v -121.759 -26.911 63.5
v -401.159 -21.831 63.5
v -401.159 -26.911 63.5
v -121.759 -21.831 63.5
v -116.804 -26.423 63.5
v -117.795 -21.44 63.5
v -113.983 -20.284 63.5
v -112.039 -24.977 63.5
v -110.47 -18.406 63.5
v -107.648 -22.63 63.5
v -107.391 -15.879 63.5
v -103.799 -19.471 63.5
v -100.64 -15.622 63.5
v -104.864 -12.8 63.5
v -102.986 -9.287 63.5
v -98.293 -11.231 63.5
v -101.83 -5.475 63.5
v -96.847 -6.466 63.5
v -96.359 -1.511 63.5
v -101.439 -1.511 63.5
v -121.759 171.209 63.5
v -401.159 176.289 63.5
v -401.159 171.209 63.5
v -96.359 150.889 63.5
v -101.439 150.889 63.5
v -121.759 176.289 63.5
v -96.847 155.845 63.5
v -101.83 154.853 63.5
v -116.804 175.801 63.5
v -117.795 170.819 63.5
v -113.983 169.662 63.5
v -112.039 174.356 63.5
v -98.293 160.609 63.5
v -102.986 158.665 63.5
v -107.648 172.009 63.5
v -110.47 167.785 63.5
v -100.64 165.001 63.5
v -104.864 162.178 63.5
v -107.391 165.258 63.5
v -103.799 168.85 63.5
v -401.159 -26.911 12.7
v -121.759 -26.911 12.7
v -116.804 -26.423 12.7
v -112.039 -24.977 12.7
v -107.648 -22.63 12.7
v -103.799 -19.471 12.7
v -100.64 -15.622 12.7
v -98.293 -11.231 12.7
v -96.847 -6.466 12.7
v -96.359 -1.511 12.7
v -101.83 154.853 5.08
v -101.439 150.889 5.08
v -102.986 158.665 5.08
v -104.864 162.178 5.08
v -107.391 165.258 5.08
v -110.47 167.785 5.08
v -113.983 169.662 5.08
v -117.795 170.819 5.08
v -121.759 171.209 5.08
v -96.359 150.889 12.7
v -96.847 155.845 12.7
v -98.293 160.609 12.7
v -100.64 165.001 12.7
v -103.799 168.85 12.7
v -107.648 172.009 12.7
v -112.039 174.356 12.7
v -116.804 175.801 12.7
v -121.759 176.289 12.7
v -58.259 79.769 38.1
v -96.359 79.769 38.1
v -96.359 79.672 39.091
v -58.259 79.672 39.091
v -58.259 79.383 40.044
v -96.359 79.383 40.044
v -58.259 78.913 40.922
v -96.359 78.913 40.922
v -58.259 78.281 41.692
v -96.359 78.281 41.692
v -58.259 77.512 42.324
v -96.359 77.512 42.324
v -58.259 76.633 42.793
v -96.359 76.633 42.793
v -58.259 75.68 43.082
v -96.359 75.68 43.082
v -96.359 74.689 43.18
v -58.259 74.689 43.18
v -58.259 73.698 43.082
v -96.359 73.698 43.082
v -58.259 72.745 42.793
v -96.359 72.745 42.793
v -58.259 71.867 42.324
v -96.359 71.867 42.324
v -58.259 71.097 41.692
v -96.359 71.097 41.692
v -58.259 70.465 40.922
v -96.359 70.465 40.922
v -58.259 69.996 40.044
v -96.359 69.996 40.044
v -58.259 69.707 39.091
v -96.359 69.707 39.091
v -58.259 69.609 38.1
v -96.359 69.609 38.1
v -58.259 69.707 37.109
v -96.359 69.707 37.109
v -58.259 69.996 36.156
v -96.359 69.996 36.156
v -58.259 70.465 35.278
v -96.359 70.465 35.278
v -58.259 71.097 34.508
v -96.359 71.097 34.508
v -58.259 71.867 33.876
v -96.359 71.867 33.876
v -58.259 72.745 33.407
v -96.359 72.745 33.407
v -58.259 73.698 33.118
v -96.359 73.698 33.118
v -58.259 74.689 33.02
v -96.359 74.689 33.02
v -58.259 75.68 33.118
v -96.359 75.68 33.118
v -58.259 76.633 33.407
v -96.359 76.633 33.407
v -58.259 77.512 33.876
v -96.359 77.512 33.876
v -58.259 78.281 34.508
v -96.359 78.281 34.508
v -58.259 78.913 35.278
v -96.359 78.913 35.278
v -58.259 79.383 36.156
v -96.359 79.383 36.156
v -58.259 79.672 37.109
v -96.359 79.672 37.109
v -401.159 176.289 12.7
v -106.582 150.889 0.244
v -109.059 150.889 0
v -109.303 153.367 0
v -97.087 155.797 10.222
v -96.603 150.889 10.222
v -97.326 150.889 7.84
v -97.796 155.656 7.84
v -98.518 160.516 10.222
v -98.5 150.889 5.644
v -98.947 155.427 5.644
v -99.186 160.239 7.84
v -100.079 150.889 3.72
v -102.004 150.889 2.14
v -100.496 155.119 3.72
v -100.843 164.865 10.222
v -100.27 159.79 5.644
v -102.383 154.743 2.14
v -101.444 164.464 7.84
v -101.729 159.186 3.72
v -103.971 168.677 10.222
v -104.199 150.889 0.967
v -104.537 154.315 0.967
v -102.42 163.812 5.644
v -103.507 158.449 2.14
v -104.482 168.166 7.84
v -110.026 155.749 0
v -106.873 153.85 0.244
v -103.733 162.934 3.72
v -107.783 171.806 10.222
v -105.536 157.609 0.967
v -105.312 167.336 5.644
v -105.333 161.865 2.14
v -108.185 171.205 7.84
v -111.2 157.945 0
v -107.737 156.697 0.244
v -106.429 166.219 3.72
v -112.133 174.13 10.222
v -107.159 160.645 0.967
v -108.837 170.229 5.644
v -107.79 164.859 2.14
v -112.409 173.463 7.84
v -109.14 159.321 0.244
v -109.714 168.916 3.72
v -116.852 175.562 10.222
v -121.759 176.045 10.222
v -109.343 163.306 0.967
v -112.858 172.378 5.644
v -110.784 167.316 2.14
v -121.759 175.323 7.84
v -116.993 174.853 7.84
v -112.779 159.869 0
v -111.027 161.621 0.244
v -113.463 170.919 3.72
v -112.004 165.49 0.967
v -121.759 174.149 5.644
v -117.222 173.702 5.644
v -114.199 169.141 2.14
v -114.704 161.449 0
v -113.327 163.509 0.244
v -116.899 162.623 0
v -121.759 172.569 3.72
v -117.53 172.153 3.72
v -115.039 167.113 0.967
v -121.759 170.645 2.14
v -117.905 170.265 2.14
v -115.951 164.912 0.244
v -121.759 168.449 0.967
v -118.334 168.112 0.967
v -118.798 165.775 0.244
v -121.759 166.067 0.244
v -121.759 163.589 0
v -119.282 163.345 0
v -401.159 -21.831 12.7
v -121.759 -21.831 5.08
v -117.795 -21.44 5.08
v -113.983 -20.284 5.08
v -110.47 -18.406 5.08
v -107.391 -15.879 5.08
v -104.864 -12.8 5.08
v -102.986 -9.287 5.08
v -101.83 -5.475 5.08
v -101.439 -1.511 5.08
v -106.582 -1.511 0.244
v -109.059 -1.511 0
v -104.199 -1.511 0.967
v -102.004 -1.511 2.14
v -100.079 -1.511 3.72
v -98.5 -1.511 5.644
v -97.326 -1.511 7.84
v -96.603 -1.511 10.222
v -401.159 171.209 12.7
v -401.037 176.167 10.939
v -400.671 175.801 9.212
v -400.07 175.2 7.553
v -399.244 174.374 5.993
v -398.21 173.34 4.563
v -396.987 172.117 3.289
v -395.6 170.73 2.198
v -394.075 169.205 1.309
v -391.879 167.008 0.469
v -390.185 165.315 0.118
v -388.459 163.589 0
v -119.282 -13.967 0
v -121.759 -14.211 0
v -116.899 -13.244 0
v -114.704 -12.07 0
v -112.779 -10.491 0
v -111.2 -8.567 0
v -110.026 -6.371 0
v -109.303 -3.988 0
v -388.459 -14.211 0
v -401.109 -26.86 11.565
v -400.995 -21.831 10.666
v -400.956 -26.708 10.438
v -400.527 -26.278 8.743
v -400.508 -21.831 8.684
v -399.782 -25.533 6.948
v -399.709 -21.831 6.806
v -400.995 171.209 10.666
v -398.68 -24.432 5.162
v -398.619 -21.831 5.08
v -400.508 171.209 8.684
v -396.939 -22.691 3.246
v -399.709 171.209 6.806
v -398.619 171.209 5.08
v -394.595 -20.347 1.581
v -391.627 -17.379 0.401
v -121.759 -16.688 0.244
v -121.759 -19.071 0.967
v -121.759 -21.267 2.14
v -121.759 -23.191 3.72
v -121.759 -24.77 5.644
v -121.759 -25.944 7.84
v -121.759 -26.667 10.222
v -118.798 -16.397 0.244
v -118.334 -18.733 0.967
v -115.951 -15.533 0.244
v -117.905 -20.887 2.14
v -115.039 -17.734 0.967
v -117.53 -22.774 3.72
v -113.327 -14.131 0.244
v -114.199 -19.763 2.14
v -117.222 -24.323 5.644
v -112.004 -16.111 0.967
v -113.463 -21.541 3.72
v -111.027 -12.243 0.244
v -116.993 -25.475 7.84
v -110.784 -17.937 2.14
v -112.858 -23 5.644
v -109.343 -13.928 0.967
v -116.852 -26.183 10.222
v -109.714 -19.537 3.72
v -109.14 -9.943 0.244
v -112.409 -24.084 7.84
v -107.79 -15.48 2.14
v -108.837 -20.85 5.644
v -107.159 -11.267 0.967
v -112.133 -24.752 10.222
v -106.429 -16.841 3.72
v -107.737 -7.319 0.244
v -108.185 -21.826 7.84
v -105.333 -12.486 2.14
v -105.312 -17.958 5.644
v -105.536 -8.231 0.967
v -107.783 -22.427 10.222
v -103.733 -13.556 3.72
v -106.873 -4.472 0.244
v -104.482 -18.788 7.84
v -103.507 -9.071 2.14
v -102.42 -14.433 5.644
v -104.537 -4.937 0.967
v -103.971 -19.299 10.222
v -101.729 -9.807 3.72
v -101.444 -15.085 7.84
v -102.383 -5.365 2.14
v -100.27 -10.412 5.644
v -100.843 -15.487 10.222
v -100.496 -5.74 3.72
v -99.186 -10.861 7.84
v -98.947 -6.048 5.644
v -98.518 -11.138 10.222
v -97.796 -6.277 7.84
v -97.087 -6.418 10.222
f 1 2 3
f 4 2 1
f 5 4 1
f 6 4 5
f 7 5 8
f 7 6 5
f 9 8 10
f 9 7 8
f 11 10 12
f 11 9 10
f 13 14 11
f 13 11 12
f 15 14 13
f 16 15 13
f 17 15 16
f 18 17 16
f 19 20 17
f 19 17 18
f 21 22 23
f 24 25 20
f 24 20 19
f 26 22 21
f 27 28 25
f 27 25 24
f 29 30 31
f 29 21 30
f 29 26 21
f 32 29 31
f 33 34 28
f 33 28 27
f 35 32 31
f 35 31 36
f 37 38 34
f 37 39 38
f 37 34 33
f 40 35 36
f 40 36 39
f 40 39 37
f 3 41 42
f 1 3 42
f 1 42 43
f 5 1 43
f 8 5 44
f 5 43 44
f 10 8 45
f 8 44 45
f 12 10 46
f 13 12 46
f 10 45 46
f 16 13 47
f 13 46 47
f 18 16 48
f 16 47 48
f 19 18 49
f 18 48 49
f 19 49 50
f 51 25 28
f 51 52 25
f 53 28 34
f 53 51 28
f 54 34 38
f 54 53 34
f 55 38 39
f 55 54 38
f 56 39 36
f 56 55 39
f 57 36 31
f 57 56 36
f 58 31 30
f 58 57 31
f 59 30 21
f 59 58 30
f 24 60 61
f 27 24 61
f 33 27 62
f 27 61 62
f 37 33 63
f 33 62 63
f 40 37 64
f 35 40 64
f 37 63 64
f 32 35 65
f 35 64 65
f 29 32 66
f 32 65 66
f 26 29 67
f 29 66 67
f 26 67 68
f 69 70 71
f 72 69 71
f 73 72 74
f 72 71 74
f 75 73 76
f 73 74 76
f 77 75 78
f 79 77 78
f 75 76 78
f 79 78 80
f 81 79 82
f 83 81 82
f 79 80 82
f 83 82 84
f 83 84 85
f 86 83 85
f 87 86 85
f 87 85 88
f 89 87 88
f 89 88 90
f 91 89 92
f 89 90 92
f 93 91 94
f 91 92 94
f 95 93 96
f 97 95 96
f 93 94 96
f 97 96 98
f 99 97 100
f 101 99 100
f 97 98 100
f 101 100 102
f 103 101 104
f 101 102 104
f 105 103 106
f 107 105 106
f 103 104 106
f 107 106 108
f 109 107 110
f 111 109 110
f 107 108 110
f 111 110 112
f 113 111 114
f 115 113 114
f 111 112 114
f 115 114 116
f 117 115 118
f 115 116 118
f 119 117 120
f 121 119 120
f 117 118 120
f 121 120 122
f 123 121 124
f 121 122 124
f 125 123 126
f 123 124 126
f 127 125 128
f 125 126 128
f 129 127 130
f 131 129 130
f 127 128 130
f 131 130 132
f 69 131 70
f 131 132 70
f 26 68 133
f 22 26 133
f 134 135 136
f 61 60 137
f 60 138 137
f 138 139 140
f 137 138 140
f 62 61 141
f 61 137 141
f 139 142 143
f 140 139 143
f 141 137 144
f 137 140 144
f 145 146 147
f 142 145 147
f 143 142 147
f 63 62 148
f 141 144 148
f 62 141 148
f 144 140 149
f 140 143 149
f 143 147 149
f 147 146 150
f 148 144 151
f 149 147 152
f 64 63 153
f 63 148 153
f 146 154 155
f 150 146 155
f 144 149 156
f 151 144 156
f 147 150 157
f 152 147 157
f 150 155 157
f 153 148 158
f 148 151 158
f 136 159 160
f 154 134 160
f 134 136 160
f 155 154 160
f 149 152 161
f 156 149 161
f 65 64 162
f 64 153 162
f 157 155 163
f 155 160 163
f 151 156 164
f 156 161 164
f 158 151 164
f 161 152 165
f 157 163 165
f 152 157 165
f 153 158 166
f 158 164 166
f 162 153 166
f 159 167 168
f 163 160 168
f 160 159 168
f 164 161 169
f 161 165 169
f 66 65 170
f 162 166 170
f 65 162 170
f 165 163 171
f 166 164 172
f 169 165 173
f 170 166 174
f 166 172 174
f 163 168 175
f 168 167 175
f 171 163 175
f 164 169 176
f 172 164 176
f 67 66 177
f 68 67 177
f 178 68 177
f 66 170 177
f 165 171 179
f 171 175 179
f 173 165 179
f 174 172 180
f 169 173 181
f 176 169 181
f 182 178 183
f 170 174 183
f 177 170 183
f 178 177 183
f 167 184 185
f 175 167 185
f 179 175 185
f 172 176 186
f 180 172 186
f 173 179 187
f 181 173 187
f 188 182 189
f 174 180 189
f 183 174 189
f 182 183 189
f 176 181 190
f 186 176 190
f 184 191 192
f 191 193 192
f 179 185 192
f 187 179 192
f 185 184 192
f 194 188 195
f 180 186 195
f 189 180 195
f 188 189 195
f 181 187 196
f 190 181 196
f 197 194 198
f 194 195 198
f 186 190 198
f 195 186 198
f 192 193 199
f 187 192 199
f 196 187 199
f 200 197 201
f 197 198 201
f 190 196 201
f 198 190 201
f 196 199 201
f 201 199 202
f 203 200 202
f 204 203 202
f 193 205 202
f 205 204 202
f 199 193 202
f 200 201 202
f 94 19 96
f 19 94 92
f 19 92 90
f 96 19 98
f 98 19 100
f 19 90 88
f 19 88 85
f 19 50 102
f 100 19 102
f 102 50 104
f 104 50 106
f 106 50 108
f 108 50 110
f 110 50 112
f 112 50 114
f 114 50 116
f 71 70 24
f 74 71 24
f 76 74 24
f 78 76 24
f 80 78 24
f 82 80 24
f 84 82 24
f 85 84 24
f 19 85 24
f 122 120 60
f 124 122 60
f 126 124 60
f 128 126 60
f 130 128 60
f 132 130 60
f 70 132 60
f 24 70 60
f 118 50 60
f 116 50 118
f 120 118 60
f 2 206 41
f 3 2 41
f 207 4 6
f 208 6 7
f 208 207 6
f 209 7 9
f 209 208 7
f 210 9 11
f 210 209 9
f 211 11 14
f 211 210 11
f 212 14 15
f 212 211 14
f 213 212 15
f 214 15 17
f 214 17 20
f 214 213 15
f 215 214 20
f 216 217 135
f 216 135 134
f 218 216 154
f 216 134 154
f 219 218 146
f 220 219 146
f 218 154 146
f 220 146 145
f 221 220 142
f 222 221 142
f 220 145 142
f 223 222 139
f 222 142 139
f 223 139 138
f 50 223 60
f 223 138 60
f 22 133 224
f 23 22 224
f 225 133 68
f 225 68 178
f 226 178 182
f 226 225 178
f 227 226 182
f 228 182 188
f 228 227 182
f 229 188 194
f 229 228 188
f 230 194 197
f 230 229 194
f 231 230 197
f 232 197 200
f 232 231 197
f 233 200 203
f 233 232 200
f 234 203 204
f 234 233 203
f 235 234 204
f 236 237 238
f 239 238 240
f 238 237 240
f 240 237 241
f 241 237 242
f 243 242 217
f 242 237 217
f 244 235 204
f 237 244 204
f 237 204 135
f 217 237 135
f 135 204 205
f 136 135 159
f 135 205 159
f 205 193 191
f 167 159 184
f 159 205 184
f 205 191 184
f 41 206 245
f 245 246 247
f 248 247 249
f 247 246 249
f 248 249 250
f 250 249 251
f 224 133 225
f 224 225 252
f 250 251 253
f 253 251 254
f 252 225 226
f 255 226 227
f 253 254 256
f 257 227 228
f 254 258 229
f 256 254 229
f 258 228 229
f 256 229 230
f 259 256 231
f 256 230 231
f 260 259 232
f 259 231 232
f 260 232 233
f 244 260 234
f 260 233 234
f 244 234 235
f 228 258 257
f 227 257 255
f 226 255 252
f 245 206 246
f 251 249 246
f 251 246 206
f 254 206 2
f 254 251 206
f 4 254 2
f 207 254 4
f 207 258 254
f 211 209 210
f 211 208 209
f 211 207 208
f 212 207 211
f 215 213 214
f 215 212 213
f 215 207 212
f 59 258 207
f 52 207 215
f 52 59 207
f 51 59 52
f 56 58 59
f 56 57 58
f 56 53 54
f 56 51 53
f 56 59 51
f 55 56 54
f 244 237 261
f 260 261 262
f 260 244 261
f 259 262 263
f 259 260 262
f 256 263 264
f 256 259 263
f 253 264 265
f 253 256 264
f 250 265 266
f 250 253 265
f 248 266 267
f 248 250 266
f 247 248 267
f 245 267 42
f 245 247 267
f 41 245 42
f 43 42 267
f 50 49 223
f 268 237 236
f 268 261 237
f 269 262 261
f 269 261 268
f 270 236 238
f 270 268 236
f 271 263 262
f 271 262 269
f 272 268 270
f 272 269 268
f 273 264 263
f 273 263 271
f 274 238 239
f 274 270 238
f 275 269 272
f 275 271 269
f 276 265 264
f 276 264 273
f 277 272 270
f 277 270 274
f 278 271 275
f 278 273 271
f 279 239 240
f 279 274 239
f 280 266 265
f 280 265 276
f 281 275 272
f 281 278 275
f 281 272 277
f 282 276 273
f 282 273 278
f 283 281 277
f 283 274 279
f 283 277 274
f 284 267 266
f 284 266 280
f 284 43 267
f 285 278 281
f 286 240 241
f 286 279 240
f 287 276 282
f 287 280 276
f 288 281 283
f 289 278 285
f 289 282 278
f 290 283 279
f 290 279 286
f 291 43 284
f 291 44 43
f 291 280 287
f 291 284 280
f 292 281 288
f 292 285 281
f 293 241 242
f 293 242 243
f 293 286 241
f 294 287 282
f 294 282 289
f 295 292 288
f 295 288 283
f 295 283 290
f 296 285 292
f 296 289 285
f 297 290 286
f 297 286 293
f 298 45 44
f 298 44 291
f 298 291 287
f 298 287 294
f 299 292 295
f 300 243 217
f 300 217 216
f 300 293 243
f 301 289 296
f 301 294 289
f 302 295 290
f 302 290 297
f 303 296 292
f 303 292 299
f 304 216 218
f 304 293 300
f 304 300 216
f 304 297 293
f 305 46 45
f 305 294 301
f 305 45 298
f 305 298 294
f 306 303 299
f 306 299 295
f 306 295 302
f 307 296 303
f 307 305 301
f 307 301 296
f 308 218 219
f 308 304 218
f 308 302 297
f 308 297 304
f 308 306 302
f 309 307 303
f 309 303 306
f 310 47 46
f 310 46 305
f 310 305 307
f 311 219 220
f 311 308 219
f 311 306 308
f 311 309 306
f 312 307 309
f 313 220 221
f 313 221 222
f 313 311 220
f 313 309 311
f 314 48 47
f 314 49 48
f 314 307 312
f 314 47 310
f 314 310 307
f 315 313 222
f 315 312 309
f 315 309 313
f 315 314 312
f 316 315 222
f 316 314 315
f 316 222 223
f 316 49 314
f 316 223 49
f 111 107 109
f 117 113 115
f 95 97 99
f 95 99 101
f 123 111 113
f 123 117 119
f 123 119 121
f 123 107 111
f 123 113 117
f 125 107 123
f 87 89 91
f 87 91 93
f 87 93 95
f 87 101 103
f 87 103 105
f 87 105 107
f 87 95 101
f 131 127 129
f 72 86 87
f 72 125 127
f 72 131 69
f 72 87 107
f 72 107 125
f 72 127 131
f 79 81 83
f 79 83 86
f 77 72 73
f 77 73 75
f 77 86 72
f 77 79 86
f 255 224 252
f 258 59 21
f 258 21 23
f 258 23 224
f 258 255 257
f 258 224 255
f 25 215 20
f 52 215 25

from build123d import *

# Parameters (mm, degrees)
F1_DEPTH     = 63.5
F2_T         = -5.08
F3_R         = 5.08
F4_DEPTH     = 38.1
F5_T1_DEPTH  = 311.15
F5_T3_DEPTH  = 266.7
F5_T5_DEPTH  = 152.4
F5_T8_ANGLE  = 90
F5_T10_ANGLE = 90


# Not quite as in the source:
# - a fillet or chamfer that OpenCascade refuses, or shapes differently, is made with other operations: its cross-section is extruded or revolved along the edge and cut away or added


with BuildPart() as f1:
    # F0 (on Top) → F1 (new body)
    with BuildSketch(Plane.XY):
        with BuildLine():
            Line((-344.2945734978, 176.2892417401), (-401.1594021572, 176.2892417401))
            Line((-401.1594021572, 176.2892417401), (-401.1594021572, -26.9107582599))
            Line((-401.1594021572, -26.9107582599), (-344.2945734978, -26.9107582599))
            Line((-344.2945734978, -26.9107582599), (-121.7594021572, -26.9107582599))
            ThreePointArc((-121.7594021572, -26.9107582599), (-103.7988899151, -19.471270502), (-96.3594021572, -1.5107582599))
            Line((-96.3594021572, -1.5107582599), (-96.3594021572, 6.5090437472))
            Line((-96.3594021572, 6.5090437472), (-96.3594021572, 44.6090437472))
            Line((-96.3594021572, 44.6090437472), (-96.3594021572, 150.8892417401))
            ThreePointArc((-96.3594021572, 150.8892417401), (-103.7988899151, 168.8497539822), (-121.7594021572, 176.2892417401))
            Line((-121.7594021572, 176.2892417401), (-344.2945734978, 176.2892417401))
        make_face()
    extrude(amount=F1_DEPTH)

    # F2
    f2_openings = [f1.faces().sort_by_distance(p)[0] for p in [
        (-249.418343, 74.689242, 63.5),
        (-401.159402, 74.689242, 31.75),
    ]]
    offset(amount=F2_T, openings=f2_openings)

    # F3 (on face) → F4 (join)
    with BuildSketch(Plane.YZ.offset(-96.3594021572)):
        with Locations((74.6892417401, 38.1)):
            Circle(F3_R)
    extrude(amount=F4_DEPTH)

    # F5: fillet of radius 12.7 on 6 edges, made by hand

    # F5_s2 → F5_t1 (cut)
    with BuildSketch(Plane.YZ.offset(-432.9094021572)):
        with BuildLine():
            ThreePointArc((176.2892417401, 12.7), (172.5694978612, 3.7197438789), (163.5892417401, 0))
            Line((163.5892417401, 0), (176.2892417401, 0))
            Line((176.2892417401, 0), (176.2892417401, 12.7))
        make_face()
        with BuildLine():
            ThreePointArc((-14.2107582599, 0), (-23.191014381, 3.7197438789), (-26.9107582599, 12.7))
            Line((-26.9107582599, 12.7), (-26.9107582599, 0))
            Line((-26.9107582599, 0), (-14.2107582599, 0))
        make_face()
    extrude(amount=F5_T1_DEPTH, mode=Mode.SUBTRACT)

    # F5_s4 → F5_t3 (cut)
    with BuildSketch(Plane.XZ.offset(-208.0392417401)):
        with BuildLine():
            ThreePointArc((-401.1594021572, 12.7), (-397.4396582783, 3.7197438789), (-388.4594021572, 0))
            Line((-388.4594021572, 0), (-401.1594021572, 0))
            Line((-401.1594021572, 0), (-401.1594021572, 12.7))
        make_face()
    extrude(amount=F5_T3_DEPTH, mode=Mode.SUBTRACT)

    # F5_s6 → F5_t5 (cut)
    with BuildSketch(Plane.XZ.offset(-150.8892417401)):
        with BuildLine():
            ThreePointArc((-109.0594021572, 0), (-100.0791460361, 3.7197438789), (-96.3594021572, 12.7))
            Line((-96.3594021572, 12.7), (-96.3594021572, 0))
            Line((-96.3594021572, 0), (-109.0594021572, 0))
        make_face()
    extrude(amount=F5_T5_DEPTH, mode=Mode.SUBTRACT)

    # F5_s7 → F5_t8 (revolve, cut)
    with BuildSketch(Plane.YZ.offset(-121.7594021572)):
        with BuildLine():
            ThreePointArc((-14.2107582599, 0), (-23.191014381, 3.7197438789), (-26.9107582599, 12.7))
            Line((-26.9107582599, 12.7), (-26.9107582599, 0))
            Line((-26.9107582599, 0), (-14.2107582599, 0))
        make_face()
    revolve(axis=Axis((-121.7594021572, -1.5107582599, 0), (0, 0, 1)), revolution_arc=F5_T8_ANGLE, mode=Mode.SUBTRACT)

    # F5_s9 → F5_t10 (revolve, cut)
    with BuildSketch(Plane.XZ.offset(-150.8892417401)):
        with BuildLine():
            ThreePointArc((-96.3594021572, 12.7), (-100.0791460361, 3.7197438789), (-109.0594021572, 0))
            Line((-109.0594021572, 0), (-96.3594021572, 0))
            Line((-96.3594021572, 0), (-96.3594021572, 12.7))
        make_face()
    revolve(axis=Axis((-121.7594021572, 150.8892417401, 0), (0, 0, 1)), revolution_arc=F5_T10_ANGLE, mode=Mode.SUBTRACT)


solid = f1.part
